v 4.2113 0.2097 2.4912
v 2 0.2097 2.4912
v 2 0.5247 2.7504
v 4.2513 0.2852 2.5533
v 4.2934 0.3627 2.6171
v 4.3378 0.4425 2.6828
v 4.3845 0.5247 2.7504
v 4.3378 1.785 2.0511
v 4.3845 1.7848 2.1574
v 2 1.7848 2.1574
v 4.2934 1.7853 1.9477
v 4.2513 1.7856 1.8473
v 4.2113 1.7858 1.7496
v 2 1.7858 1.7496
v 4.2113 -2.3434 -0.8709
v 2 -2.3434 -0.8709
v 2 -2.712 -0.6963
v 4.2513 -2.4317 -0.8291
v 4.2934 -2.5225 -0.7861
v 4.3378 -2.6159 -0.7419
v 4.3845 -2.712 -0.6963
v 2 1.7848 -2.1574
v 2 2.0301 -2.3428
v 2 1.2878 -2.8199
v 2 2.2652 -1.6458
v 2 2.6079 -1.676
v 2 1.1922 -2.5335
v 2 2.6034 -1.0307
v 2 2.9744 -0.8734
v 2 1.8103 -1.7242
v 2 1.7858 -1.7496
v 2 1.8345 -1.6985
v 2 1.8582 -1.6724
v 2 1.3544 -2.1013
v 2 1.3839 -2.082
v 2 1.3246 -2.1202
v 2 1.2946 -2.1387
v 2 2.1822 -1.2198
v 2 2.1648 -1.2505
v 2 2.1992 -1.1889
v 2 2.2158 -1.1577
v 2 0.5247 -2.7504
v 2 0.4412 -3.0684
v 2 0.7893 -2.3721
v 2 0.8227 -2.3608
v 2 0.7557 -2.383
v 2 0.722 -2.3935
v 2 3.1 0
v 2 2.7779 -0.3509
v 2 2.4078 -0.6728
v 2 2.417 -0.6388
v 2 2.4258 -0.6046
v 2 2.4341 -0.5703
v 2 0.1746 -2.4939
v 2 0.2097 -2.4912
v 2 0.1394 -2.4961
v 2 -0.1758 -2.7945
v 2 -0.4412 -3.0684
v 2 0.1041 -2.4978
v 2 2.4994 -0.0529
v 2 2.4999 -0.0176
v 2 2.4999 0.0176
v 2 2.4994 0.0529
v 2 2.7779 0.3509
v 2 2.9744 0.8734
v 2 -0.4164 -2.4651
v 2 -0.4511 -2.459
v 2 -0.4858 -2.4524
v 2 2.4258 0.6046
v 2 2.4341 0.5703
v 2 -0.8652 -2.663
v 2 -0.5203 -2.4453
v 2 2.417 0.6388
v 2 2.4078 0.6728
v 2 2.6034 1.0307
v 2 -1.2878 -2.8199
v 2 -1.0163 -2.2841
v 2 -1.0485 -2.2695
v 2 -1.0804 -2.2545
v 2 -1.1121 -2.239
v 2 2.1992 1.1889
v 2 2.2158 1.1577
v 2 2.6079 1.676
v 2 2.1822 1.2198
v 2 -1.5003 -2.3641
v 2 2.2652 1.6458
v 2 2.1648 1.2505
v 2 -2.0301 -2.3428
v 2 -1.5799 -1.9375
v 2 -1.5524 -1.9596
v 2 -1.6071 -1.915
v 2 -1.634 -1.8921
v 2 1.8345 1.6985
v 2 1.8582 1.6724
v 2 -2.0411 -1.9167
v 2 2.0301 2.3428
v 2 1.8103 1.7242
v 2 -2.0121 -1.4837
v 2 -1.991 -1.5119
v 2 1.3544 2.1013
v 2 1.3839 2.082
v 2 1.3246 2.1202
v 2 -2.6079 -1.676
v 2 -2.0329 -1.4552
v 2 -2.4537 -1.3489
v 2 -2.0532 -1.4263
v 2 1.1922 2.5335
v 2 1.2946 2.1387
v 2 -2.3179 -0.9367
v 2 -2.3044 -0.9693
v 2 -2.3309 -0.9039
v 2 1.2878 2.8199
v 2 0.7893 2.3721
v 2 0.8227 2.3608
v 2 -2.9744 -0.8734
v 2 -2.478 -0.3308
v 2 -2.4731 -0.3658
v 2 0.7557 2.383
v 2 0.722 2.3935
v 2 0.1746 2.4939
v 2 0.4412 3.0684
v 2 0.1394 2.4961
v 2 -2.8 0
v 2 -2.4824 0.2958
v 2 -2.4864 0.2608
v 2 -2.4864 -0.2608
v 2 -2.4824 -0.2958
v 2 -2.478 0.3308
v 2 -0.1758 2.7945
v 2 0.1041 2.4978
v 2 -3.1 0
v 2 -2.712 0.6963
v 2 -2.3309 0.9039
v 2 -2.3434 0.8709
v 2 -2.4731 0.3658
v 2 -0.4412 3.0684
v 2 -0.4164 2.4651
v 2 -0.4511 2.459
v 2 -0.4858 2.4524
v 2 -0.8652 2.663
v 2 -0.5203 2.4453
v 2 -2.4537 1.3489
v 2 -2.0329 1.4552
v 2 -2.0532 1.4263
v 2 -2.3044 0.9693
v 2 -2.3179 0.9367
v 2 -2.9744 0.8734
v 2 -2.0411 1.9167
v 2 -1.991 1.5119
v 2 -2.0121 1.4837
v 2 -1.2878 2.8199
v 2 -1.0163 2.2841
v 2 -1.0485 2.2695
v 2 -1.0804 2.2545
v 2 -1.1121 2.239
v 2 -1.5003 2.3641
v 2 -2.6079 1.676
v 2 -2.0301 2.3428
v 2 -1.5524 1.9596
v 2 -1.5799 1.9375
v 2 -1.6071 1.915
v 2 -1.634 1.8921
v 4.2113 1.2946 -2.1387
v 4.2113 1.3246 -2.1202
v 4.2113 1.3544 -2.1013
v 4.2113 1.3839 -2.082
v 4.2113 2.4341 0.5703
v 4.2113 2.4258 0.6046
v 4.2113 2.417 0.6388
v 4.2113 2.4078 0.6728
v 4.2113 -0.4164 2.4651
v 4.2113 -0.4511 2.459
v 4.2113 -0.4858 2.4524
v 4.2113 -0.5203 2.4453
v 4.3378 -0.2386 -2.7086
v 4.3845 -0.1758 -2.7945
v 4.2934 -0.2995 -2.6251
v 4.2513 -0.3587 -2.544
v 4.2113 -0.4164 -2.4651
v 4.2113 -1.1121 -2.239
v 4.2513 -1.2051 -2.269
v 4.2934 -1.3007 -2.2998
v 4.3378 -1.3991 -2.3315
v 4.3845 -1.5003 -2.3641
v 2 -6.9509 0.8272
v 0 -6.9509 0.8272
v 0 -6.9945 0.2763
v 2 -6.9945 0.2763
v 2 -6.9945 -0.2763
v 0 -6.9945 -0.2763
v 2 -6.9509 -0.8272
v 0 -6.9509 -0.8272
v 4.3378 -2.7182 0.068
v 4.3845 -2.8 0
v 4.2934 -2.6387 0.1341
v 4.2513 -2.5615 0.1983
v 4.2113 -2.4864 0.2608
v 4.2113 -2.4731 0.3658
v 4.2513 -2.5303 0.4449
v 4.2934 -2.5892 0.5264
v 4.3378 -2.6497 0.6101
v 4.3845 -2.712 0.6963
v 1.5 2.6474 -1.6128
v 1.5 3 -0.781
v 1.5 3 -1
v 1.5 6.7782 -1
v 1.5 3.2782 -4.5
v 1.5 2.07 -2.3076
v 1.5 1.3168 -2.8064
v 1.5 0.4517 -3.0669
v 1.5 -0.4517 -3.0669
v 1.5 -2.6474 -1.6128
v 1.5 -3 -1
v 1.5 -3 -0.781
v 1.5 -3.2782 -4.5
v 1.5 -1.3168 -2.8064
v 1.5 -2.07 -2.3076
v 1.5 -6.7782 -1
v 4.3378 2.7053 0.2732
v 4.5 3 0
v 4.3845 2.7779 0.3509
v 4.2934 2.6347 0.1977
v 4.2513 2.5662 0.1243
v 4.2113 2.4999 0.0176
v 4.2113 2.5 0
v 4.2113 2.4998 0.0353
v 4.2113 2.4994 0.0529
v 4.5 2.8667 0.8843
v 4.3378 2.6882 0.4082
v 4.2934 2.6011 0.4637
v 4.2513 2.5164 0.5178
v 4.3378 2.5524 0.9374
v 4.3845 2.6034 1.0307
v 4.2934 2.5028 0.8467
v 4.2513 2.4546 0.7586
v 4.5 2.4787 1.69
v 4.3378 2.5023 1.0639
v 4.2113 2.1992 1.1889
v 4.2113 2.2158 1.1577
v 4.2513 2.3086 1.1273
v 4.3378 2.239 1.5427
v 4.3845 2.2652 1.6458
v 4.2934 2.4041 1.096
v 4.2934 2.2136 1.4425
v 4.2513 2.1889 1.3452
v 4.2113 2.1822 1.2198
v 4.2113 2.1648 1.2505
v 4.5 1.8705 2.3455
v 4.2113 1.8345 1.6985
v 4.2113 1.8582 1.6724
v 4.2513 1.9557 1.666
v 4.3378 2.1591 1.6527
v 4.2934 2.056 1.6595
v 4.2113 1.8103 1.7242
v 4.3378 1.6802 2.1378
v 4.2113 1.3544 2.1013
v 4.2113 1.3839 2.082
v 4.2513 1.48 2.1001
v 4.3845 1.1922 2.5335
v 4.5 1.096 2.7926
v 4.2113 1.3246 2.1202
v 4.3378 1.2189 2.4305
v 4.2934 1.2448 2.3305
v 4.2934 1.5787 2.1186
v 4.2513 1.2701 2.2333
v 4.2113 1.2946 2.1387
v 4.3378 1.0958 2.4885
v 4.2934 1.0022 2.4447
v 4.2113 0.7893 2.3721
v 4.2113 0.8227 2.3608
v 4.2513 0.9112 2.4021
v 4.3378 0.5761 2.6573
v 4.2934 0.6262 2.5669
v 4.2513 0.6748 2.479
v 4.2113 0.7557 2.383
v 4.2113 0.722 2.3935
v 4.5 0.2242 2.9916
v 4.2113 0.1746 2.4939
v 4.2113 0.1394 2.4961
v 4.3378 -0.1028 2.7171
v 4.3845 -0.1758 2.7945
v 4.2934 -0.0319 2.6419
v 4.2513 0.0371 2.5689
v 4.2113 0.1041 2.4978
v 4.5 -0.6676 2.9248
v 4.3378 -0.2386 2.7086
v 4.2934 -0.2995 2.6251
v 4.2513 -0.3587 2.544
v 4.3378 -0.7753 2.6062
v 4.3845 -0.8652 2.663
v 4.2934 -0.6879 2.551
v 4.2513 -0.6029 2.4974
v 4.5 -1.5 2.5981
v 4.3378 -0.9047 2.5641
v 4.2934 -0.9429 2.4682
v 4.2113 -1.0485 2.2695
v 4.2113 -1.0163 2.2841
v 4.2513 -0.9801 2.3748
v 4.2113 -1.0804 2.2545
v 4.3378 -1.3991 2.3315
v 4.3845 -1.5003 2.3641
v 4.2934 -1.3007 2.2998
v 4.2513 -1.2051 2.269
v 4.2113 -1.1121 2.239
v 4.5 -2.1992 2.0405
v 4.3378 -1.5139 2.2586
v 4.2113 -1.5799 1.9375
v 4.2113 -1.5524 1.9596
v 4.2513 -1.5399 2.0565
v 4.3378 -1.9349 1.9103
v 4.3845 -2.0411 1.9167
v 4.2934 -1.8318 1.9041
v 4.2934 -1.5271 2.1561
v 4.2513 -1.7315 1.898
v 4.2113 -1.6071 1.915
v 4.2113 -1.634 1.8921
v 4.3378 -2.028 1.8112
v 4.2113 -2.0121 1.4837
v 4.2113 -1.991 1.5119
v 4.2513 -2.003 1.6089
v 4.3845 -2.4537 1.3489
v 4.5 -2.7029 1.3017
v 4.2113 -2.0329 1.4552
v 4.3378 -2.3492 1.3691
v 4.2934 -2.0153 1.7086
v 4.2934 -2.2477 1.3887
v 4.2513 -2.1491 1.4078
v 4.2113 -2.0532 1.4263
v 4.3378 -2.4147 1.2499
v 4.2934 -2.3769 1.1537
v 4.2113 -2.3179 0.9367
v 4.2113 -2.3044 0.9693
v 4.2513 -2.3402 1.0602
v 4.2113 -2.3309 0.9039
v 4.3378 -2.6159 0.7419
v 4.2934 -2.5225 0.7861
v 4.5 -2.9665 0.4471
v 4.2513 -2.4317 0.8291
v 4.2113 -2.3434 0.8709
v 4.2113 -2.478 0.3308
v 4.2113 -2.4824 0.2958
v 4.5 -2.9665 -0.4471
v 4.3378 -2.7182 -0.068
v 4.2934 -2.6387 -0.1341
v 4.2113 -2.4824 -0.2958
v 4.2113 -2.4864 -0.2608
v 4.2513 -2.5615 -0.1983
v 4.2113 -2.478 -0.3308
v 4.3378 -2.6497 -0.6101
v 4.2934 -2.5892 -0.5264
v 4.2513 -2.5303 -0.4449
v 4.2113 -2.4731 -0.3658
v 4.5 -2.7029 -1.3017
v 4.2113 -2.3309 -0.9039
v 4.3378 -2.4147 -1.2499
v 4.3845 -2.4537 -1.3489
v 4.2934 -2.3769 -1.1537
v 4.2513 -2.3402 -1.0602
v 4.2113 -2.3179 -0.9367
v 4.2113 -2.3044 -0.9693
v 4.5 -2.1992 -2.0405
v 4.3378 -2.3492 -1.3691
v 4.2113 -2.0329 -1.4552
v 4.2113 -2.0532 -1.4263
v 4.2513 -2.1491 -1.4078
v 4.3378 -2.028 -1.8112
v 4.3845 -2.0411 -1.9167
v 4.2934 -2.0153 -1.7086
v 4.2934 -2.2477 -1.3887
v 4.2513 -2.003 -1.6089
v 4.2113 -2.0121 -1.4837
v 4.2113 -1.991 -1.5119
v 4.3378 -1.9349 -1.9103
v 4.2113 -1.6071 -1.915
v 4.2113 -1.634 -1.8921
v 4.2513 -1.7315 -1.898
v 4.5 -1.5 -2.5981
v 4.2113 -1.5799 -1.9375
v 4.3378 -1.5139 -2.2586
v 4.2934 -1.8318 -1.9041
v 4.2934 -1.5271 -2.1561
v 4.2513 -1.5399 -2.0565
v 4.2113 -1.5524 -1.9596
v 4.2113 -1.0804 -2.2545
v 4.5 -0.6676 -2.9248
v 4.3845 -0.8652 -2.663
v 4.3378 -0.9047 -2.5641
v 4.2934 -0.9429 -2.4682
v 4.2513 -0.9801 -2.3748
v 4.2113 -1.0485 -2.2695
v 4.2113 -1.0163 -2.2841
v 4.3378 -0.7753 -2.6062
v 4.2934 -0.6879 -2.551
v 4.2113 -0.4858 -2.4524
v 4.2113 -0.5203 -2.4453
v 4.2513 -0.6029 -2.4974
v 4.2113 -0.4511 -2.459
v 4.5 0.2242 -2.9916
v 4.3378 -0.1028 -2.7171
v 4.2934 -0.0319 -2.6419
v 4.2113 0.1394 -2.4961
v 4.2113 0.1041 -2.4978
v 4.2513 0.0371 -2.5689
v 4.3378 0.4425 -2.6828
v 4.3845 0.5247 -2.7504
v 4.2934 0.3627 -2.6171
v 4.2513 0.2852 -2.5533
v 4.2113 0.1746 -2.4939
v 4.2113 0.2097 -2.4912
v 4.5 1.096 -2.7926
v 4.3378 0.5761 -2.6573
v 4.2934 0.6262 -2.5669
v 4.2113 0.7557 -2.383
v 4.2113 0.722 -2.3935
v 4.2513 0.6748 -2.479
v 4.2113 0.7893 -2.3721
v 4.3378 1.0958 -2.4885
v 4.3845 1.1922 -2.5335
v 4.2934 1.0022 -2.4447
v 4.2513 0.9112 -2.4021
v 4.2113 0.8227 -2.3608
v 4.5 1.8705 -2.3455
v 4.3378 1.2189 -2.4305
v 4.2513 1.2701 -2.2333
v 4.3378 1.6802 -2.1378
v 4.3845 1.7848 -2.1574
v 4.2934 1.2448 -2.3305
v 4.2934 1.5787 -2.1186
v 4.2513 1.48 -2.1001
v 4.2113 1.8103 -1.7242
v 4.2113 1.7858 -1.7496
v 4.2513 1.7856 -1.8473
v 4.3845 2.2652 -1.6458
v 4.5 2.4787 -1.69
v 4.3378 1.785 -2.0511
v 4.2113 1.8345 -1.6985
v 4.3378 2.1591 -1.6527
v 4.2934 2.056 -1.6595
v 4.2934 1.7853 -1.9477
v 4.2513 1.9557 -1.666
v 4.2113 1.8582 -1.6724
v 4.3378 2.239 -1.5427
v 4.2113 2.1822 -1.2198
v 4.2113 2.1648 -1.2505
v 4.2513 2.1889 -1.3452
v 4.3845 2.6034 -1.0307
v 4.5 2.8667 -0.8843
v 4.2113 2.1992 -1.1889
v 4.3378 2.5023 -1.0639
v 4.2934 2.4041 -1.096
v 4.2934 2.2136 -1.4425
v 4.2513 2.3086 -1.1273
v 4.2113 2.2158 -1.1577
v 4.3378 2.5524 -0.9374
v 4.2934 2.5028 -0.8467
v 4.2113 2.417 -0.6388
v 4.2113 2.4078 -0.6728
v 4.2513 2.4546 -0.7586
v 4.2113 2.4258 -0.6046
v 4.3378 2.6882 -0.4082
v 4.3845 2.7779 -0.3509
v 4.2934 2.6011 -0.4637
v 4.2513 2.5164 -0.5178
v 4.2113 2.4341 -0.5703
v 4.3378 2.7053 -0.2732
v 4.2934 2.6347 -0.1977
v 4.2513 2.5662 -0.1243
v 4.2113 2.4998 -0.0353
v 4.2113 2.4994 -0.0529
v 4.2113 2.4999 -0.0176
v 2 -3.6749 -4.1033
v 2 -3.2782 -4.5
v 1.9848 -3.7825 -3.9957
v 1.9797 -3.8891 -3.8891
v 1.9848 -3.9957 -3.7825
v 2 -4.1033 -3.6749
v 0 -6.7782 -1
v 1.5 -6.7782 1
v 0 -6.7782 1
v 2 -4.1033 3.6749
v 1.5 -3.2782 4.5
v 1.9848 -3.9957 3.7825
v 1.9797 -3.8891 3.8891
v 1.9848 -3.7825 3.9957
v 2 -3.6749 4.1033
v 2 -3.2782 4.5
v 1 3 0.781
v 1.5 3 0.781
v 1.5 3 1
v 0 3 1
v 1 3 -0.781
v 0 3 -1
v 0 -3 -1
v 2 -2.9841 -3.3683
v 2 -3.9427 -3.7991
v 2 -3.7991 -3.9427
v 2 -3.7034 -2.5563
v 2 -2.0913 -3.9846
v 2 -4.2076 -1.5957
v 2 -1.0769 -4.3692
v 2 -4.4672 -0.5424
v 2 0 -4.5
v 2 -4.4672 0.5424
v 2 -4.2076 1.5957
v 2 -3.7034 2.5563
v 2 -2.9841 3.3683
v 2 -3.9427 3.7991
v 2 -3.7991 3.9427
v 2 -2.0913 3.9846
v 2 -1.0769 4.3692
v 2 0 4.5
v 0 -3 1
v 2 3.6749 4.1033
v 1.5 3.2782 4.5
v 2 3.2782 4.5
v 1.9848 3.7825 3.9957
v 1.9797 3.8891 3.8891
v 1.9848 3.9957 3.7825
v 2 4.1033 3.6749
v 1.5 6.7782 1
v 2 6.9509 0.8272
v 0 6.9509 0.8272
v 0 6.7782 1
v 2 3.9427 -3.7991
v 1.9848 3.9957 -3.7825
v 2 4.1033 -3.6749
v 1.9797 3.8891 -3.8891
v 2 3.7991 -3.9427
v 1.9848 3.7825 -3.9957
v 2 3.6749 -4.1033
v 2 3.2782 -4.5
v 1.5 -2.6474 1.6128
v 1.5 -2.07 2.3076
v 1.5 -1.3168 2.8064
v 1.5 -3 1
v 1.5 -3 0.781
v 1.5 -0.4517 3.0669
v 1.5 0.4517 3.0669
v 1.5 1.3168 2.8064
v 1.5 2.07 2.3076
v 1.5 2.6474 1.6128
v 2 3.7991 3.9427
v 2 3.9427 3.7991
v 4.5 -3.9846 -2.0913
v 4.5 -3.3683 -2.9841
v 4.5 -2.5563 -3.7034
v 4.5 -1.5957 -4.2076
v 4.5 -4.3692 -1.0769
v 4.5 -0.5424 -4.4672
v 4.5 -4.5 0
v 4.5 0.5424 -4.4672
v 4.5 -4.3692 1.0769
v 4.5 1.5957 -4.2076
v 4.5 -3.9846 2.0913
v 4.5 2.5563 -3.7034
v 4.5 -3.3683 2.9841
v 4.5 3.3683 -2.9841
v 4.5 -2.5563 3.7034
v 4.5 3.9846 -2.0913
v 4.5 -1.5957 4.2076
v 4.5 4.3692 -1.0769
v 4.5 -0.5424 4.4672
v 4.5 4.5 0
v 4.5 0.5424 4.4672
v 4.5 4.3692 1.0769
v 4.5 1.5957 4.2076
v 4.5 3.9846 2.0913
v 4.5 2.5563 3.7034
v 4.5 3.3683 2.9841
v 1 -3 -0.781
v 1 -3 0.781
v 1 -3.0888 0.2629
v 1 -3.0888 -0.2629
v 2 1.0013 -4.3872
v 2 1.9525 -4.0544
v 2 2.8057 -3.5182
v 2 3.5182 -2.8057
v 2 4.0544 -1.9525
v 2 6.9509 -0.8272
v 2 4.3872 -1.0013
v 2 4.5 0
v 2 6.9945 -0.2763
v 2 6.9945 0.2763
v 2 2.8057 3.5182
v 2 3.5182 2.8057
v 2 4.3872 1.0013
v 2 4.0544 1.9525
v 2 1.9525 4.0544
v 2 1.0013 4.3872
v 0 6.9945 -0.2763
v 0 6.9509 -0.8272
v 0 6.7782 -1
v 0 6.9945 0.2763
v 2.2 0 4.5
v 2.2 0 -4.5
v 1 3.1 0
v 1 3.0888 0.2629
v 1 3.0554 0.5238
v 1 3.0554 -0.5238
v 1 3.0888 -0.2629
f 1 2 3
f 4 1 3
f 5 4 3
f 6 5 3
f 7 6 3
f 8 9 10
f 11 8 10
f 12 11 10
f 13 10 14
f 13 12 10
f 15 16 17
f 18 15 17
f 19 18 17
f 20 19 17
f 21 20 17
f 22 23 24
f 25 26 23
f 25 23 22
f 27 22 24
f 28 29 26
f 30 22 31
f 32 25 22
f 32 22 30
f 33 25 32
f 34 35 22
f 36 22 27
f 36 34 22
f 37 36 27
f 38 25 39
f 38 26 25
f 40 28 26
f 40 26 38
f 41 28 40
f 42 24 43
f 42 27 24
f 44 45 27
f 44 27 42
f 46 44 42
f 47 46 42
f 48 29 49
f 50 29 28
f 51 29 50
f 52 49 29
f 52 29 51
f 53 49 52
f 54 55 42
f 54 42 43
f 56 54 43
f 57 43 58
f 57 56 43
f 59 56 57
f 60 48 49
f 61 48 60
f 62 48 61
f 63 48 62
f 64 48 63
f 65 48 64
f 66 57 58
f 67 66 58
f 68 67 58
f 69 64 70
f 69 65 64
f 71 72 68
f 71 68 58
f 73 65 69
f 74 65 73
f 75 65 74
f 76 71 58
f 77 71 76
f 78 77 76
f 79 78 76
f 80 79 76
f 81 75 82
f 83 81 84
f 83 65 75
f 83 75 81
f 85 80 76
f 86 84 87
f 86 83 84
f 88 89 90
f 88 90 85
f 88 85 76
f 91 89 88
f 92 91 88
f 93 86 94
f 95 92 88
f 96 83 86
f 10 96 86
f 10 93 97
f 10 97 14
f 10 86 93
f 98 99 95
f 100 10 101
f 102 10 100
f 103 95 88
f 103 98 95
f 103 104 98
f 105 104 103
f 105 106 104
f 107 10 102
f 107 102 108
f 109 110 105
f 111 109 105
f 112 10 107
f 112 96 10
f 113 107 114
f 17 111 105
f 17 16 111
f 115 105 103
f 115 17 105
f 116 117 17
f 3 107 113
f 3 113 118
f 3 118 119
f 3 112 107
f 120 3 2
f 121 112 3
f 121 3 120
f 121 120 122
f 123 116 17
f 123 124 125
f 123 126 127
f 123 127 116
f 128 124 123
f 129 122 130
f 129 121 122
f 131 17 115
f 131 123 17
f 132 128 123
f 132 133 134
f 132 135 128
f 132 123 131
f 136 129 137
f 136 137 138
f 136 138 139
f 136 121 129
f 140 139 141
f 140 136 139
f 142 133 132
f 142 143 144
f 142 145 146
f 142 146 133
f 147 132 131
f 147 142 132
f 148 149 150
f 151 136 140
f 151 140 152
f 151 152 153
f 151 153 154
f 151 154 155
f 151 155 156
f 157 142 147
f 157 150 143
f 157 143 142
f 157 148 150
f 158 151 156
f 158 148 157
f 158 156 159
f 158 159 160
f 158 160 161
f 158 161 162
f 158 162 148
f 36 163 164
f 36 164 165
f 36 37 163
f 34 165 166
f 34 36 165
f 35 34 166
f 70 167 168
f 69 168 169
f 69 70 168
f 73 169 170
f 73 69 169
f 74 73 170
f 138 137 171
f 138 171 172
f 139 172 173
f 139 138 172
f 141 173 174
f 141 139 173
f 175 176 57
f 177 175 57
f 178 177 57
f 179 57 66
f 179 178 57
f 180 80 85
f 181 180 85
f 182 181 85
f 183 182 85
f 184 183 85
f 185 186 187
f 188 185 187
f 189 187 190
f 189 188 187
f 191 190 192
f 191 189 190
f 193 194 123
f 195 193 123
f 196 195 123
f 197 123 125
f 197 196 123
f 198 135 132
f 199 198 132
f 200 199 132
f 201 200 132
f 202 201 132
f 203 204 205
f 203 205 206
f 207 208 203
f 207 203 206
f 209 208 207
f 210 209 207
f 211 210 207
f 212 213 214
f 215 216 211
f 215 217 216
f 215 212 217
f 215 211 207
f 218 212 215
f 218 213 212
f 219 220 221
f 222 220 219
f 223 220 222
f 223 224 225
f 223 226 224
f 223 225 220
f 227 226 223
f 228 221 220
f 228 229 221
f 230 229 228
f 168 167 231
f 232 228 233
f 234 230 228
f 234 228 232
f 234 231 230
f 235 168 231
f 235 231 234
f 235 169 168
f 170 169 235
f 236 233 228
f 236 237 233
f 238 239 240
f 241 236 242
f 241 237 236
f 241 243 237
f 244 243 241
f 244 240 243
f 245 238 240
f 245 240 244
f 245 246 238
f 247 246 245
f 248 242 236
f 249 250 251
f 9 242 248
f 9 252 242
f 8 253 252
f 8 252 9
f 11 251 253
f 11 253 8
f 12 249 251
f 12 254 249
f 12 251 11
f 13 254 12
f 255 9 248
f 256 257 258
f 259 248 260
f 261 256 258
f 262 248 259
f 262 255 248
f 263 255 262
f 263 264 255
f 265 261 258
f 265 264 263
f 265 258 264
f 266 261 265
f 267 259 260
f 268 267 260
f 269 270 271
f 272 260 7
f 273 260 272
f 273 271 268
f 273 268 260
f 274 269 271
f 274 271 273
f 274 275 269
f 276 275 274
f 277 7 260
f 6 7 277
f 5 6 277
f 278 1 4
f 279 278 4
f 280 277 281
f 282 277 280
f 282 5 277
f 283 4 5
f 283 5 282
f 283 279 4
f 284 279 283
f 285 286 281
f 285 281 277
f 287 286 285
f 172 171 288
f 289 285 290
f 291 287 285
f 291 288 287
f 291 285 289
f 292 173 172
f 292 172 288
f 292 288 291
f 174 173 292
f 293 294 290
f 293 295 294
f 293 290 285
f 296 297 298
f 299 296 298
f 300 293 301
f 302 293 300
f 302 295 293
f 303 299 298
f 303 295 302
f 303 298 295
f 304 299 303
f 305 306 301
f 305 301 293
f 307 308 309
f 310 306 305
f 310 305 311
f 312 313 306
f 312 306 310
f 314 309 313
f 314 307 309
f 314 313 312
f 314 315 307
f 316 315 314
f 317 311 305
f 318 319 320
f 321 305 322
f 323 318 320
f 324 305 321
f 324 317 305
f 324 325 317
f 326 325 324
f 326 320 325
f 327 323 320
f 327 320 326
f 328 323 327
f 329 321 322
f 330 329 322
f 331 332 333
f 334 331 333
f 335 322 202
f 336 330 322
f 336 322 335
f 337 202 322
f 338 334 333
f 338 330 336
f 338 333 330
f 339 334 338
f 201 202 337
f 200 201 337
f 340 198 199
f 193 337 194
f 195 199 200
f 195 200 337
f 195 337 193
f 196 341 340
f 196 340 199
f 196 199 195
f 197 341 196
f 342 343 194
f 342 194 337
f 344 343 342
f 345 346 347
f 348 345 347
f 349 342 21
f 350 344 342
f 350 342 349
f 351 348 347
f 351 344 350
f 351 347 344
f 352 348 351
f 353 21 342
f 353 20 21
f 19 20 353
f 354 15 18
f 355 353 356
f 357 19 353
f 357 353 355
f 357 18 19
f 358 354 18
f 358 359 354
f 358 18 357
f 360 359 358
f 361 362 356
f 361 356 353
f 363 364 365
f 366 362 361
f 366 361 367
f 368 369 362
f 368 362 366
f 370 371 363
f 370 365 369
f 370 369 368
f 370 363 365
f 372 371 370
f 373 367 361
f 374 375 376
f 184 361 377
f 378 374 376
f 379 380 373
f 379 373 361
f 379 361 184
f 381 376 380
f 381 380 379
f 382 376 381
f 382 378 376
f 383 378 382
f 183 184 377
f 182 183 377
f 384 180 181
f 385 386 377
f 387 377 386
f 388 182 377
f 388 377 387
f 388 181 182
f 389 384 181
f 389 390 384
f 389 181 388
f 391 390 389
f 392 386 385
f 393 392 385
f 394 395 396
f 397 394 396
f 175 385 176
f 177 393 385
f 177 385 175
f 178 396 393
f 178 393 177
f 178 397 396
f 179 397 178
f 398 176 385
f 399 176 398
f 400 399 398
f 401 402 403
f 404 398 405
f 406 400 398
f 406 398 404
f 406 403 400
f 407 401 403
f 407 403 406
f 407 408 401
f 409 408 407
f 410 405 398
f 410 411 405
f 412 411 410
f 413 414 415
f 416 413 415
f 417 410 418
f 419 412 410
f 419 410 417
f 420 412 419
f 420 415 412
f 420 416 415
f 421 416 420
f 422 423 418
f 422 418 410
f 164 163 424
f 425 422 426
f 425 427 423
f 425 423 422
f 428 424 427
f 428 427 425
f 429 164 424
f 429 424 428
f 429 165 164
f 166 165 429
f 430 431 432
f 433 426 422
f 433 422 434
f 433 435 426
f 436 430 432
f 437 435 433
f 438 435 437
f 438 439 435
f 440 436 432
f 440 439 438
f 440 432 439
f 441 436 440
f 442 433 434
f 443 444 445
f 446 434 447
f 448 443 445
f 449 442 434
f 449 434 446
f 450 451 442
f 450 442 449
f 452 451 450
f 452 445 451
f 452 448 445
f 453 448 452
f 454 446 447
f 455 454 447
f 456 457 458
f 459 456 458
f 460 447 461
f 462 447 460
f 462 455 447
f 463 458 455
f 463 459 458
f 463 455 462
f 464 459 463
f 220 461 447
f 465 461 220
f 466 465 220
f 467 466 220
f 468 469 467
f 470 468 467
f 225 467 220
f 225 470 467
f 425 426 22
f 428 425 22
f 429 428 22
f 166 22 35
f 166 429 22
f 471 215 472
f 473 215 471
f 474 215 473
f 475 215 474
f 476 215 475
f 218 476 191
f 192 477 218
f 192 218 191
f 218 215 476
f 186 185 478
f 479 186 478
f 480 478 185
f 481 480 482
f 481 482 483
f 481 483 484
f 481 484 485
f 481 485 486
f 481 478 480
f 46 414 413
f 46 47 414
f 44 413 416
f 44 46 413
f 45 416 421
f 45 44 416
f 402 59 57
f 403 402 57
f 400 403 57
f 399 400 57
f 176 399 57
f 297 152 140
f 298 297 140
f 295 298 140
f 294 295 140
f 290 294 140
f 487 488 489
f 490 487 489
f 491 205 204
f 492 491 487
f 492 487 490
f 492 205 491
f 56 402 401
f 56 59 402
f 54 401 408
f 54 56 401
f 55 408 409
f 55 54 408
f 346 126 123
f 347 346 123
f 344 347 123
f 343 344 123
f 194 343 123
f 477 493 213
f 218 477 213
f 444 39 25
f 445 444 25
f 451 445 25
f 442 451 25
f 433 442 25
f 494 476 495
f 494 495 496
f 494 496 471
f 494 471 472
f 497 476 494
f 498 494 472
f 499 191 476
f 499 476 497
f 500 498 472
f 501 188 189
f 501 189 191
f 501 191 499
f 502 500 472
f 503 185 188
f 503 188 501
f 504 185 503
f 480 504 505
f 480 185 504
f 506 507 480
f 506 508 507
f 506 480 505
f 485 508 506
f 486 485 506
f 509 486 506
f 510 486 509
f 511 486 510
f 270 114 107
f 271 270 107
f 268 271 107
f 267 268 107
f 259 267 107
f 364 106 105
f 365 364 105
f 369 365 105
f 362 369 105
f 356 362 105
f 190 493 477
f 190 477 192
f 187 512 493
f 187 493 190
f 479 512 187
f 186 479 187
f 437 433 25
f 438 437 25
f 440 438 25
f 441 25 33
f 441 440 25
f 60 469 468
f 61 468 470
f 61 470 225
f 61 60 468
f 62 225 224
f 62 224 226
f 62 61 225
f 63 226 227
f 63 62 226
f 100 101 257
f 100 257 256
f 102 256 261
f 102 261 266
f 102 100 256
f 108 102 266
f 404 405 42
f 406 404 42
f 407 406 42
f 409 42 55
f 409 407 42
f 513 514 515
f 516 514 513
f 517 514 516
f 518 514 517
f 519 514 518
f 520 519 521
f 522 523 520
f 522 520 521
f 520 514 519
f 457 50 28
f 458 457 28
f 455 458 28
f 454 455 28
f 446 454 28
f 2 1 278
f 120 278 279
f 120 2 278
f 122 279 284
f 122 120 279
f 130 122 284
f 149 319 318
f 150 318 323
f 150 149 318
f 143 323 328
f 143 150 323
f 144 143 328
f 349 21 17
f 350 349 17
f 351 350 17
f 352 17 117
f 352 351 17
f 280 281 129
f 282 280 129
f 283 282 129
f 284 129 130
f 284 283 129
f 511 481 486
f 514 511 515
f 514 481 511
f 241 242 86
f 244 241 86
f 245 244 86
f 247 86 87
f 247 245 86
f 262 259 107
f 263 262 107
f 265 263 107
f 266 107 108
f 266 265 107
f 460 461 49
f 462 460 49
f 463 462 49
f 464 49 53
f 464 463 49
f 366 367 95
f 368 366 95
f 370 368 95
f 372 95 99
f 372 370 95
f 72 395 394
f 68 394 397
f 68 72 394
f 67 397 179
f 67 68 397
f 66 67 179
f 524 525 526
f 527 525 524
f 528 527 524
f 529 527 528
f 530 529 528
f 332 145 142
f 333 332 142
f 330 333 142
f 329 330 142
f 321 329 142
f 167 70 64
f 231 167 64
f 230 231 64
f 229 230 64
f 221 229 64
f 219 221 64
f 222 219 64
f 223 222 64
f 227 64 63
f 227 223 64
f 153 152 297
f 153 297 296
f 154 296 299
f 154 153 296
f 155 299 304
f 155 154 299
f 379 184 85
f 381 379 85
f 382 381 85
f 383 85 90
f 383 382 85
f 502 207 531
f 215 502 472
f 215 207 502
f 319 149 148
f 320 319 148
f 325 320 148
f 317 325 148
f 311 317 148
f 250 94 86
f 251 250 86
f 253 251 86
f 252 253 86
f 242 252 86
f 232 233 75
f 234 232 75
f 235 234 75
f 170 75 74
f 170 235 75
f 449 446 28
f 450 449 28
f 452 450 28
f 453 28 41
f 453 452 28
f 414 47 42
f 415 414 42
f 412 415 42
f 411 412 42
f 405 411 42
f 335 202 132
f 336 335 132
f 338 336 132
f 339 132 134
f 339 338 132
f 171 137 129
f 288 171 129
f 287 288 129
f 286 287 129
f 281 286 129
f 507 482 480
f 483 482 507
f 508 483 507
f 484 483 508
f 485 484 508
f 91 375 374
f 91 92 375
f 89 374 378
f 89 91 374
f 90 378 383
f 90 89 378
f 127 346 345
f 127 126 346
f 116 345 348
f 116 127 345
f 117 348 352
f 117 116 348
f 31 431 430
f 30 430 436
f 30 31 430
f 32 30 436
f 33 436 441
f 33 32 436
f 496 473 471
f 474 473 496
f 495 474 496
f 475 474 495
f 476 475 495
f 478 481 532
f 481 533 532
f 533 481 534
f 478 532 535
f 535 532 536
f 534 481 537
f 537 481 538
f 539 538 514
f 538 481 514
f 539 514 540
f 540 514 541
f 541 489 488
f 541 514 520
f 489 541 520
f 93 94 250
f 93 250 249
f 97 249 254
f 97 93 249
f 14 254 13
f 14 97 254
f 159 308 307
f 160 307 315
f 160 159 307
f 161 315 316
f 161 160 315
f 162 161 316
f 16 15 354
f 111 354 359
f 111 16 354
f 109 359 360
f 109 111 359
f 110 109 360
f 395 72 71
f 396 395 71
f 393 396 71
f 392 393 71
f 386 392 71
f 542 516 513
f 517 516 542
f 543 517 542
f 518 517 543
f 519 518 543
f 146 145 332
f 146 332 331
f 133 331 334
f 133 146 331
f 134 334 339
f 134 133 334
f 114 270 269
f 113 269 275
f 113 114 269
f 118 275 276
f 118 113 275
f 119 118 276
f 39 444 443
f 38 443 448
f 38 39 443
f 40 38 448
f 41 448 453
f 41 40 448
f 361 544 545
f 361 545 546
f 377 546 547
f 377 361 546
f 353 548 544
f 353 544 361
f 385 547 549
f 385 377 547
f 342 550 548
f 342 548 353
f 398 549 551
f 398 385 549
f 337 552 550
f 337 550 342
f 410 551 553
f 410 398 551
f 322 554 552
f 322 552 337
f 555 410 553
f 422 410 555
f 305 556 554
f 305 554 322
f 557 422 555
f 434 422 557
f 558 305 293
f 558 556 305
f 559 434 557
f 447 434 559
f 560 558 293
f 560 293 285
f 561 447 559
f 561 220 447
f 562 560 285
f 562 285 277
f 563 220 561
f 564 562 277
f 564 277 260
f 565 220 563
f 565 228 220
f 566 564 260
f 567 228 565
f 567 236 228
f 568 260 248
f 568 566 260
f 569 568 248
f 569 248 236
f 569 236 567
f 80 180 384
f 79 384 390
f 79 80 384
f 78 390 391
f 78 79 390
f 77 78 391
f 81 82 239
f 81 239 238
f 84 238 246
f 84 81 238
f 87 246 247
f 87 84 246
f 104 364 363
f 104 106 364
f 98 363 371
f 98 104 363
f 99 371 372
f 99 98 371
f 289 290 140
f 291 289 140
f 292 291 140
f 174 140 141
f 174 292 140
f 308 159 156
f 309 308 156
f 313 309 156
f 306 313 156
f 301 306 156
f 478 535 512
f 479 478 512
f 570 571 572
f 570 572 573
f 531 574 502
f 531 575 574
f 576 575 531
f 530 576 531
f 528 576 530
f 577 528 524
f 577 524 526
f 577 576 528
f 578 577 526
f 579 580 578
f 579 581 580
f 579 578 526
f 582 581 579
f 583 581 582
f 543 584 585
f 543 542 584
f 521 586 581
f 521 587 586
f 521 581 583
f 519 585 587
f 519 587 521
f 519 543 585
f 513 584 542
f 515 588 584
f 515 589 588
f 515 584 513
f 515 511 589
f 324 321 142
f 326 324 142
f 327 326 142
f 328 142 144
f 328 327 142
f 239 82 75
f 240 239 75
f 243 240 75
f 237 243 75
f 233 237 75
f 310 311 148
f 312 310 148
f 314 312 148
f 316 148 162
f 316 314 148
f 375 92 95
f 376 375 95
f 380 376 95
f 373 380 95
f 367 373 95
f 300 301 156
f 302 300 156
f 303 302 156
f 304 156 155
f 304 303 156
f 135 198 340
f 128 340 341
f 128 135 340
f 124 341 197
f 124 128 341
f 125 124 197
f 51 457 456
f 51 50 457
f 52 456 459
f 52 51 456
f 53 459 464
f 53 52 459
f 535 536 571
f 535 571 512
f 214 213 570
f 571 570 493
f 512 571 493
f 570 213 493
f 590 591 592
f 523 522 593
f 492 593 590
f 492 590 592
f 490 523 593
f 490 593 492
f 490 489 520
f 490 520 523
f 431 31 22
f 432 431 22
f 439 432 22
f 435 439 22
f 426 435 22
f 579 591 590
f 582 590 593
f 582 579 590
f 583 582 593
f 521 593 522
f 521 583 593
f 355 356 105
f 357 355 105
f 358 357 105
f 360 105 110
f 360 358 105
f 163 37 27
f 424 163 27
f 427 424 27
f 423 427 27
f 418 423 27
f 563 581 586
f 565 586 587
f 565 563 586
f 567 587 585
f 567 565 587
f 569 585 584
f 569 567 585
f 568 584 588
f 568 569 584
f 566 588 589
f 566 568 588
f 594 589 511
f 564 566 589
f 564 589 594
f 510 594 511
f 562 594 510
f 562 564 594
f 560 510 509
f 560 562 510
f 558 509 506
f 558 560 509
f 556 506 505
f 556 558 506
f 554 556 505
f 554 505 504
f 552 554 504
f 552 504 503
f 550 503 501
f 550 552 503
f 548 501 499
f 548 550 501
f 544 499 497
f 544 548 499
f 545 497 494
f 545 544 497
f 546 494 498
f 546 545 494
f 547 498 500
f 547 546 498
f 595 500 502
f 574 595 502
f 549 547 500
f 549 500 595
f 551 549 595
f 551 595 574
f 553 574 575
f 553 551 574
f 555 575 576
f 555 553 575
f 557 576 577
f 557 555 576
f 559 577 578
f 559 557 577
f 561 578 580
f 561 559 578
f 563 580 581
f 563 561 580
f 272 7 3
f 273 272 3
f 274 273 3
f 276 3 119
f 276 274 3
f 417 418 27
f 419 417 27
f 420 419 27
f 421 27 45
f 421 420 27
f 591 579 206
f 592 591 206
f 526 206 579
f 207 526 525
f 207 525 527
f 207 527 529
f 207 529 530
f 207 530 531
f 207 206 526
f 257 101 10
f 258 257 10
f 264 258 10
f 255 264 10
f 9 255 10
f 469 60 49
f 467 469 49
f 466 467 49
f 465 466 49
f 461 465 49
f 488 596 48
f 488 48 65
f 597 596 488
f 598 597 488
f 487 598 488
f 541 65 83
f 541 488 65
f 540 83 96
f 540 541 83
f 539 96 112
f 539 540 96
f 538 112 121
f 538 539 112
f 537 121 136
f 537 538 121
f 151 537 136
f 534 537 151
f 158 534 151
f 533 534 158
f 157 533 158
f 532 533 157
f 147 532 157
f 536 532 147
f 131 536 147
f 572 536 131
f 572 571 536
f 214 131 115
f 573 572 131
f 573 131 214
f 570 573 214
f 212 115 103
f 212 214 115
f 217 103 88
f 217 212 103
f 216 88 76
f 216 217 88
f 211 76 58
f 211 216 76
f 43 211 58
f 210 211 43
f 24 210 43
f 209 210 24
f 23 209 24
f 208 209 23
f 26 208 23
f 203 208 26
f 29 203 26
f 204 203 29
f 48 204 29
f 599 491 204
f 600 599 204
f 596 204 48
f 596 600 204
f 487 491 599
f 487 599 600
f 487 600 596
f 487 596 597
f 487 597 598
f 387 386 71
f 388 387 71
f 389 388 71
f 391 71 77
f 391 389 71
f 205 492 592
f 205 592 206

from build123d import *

# Parameters (mm, degrees)
CHAMFER_1_SIZE           = 0.5
CHAMFER_1_SIZE2          = 0.288675135
CUT_EXTRUDE_1_DEPTH      = 2.5
M3X0_51_AT_2_COUNT       = 2
M3X0_51_AT_2_PITCH       = 10
M3X0_51_AT_3_COUNT       = 2
M3X0_51_AT_3_PITCH       = 14.142135624
M3X0_51_AT_4_COUNT       = 2
M3X0_51_AT_4_PITCH       = 10
SKETCH_7_W               = 2
SKETCH_7_H               = 3
SKETCH_8_OUTSIDE_W       = 20.06
SKETCH_8_OUTSIDE_H       = 20.06
CUT_EXTRUDE_2_DEPTH      = 2.2
SKETCH_9_W               = 1.5
SKETCH_9_H               = 6
CUT_EXTRUDE_3_DEPTH      = 10
CUT_EXTRUDE_4_DEPTH      = 8
CUT_EXTRUDE_4_DEPTH_BACK = 8


with BuildPart() as part:
    # Эскиз1 → Повернуть1 (revolve)
    with BuildSketch(Plane.XY):
        Polygon((0, 1.5), (0, 10), (2, 10), (2, 4.5), (4.5, 4.5), (4.5, 2.5), (2, 2.5), (2, 3.1), (1, 3.1), (1, 1.5), align=None)
    revolve(axis=Axis((0, 0, 0), (1, 0, 0)))

    # Фаска1
    chamfer_1_edges = [part.edges().sort_by_distance(p)[0] for p in [
        (4.5, -2.5, 0),
    ]]
    chamfer_1_side = [part.faces().sort_by_distance(p)[0] for p in [
        (4.5, -4.372720779, 0),
    ]]
    chamfer(chamfer_1_edges, length=CHAMFER_1_SIZE, length2=CHAMFER_1_SIZE2, reference=chamfer_1_side[0])

    # Эскиз3 → Вырез-Вытянуть1 (cut)
    with BuildSketch(Plane(origin=(4.5, 0, 0), x_dir=(0, 0, -1), z_dir=(1, 0, 0))):
        Polygon((0, 2.45), (0.350933054, 2.777921164), (0.609290224, 2.373028745), (1.030748748, 2.60337416), (1.180296502, 2.146951366), (1.645798706, 2.265247584), (1.67714041, 1.785973137), (2.15743708, 1.784787171), (2.068603417, 1.312775648), (2.533515747, 1.192182016), (2.330088465, 0.757091636), (2.750404302, 0.524667681), (2.445165485, 0.153836773), (2.79447484, -0.175813455), (2.406603764, -0.459084221), (2.662958246, -0.865247584), (2.216826279, -1.043159264), (2.364118191, -1.500315026), (1.887757445, -1.561688775), (1.916731897, -2.041112157), (1.440073868, -1.982091636), (1.348910287, -2.453658704), (0.901905154, -2.27795239), (0.696331684, -2.712032851), (0.307066422, -2.430681018), (0, -2.8), (-0.307066422, -2.430681018), (-0.696331684, -2.712032851), (-0.901905154, -2.27795239), (-1.348910287, -2.453658704), (-1.440073868, -1.982091636), (-1.916731897, -2.041112157), (-1.887757445, -1.561688775), (-2.364118191, -1.500315026), (-2.216826279, -1.043159264), (-2.662958246, -0.865247584), (-2.406603764, -0.459084221), (-2.79447484, -0.175813455), (-2.445165485, 0.153836773), (-2.750404302, 0.524667681), (-2.330088465, 0.757091636), (-2.533515747, 1.192182016), (-2.068603417, 1.312775648), (-2.15743708, 1.784787171), (-1.67714041, 1.785973137), (-1.645798706, 2.265247584), (-1.180296502, 2.146951366), (-1.030748748, 2.60337416), (-0.609290224, 2.373028745), (-0.350933054, 2.777921164), align=None)
    extrude(amount=-CUT_EXTRUDE_1_DEPTH, mode=Mode.SUBTRACT)

    # Эскиз6 → Отверстие обработанное метчиком M3x0.51 (revolve, cut)
    with BuildSketch(Plane(origin=(0, 5, -5), x_dir=(0, 0, 1), z_dir=(0, 1, 0))):
        Polygon((0, 0), (0, 2), (1.6, 2), (1.25, 1.754927362), (1.25, 0.245072638), (1.6, 0), align=None)
    m3x0_51 = revolve(axis=Axis((-6.35, 5, -5), (1, 0, 0)), mode=Mode.SUBTRACT)

    # Отверстие обработанное метчиком M3x0.51 at 2: Отверстие обработанное метчиком M3x0.51 ×2
    with Locations(*[(0, 0, i * M3X0_51_AT_2_PITCH) for i in range(1, M3X0_51_AT_2_COUNT)]):
        add(m3x0_51, mode=Mode.SUBTRACT)

    # Отверстие обработанное метчиком M3x0.51 at 3: Отверстие обработанное метчиком M3x0.51 ×2
    with Locations(*[Vector(0, -0.707106781, 0.707106781) * (i * M3X0_51_AT_3_PITCH) for i in range(1, M3X0_51_AT_3_COUNT)]):
        add(m3x0_51, mode=Mode.SUBTRACT)

    # Отверстие обработанное метчиком M3x0.51 at 4: Отверстие обработанное метчиком M3x0.51 ×2
    with Locations(*[(0, -i * M3X0_51_AT_4_PITCH, 0) for i in range(1, M3X0_51_AT_4_COUNT)]):
        add(m3x0_51, mode=Mode.SUBTRACT)

    # Эскиз7 → Вырез-Повернуть1 (revolve, cut)
    with BuildSketch(Plane.XY):
        with Locations((1, 8.5)):
            Rectangle(SKETCH_7_W, SKETCH_7_H)
    revolve(axis=Axis((0, 0, 0), (1, 0, 0)), mode=Mode.SUBTRACT)

    # Эскиз8 outside → Вырез-Вытянуть2 (cut)
    with BuildSketch(Plane.ZY):
        Rectangle(SKETCH_8_OUTSIDE_W, SKETCH_8_OUTSIDE_H)
        Polygon((-0.827225118, 6.950949475), (-4.5, 3.278174593), (-4.5, -3.278174593), (-0.827225118, -6.950949475), (-0.827225118, -8.301176924), (0.827225118, -8.301176924), (0.827225118, -6.950949475), (4.5, -3.278174593), (4.5, 3.278174593), (0.827225118, 6.950949475), (0.827225118, 9.049308712), (-0.827225118, 9.049308712), align=None, mode=Mode.SUBTRACT)
    extrude(amount=-CUT_EXTRUDE_2_DEPTH, mode=Mode.SUBTRACT)

    # Эскиз9 → Вырез-Вытянуть3 (cut, through all)
    with BuildSketch(Plane(origin=(0, 0, -4.5), x_dir=(-1, 0, 0), z_dir=(0, 0, -1))):
        with Locations((-0.75, 0)):
            Rectangle(SKETCH_9_W, SKETCH_9_H)
    extrude(amount=-CUT_EXTRUDE_3_DEPTH, mode=Mode.SUBTRACT)

    # Эскиз10 → Вырез-Вытянуть4 (cut, two sides)
    with BuildSketch(Plane(origin=(0, 0, 0), x_dir=(1, 0, 0), z_dir=(0, 1, 0))) as cut_extrude_4_sk:
        Polygon((0, -1), (0, 1), (1.5, 1), (1.5, 5.512863142), (-0.606676523, 5.512863142), (-0.606676523, -5.078399816), (1.5, -5.078399816), (1.5, -1), align=None)
    extrude(amount=CUT_EXTRUDE_4_DEPTH, mode=Mode.SUBTRACT)
    extrude(cut_extrude_4_sk.sketch, amount=-CUT_EXTRUDE_4_DEPTH_BACK, mode=Mode.SUBTRACT)


solid = part.part
